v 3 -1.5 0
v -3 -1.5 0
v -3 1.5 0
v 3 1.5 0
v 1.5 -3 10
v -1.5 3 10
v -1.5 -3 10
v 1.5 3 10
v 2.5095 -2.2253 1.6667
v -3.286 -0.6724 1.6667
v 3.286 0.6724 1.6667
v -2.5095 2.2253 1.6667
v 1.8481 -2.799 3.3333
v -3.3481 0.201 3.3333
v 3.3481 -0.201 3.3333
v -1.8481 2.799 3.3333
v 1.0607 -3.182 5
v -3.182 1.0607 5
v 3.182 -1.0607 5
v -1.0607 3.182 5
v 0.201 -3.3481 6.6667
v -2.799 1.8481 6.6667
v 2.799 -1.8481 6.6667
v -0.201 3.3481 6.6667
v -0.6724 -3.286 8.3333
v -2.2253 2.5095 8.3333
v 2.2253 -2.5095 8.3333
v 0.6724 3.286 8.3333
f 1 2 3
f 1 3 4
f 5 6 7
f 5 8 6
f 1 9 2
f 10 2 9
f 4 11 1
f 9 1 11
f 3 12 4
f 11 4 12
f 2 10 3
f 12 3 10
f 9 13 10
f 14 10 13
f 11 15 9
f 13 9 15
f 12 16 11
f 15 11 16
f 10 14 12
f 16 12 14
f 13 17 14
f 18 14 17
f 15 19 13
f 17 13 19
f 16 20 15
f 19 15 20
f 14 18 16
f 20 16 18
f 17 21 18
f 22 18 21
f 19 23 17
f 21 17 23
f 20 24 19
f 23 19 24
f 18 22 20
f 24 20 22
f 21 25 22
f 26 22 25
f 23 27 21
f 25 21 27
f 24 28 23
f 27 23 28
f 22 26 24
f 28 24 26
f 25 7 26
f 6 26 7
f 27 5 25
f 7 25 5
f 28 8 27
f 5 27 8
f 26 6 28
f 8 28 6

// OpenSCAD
// Seeded fault for tools/scad2step.py (TV-015): a twisted extrusion, one top-level object whose
// side faces FreeCAD 1.1.3 builds as BSplineSurface (check C5; observed 2026-09-27).
linear_extrude(height = 10, twist = 90) square([6, 3], center = true);
